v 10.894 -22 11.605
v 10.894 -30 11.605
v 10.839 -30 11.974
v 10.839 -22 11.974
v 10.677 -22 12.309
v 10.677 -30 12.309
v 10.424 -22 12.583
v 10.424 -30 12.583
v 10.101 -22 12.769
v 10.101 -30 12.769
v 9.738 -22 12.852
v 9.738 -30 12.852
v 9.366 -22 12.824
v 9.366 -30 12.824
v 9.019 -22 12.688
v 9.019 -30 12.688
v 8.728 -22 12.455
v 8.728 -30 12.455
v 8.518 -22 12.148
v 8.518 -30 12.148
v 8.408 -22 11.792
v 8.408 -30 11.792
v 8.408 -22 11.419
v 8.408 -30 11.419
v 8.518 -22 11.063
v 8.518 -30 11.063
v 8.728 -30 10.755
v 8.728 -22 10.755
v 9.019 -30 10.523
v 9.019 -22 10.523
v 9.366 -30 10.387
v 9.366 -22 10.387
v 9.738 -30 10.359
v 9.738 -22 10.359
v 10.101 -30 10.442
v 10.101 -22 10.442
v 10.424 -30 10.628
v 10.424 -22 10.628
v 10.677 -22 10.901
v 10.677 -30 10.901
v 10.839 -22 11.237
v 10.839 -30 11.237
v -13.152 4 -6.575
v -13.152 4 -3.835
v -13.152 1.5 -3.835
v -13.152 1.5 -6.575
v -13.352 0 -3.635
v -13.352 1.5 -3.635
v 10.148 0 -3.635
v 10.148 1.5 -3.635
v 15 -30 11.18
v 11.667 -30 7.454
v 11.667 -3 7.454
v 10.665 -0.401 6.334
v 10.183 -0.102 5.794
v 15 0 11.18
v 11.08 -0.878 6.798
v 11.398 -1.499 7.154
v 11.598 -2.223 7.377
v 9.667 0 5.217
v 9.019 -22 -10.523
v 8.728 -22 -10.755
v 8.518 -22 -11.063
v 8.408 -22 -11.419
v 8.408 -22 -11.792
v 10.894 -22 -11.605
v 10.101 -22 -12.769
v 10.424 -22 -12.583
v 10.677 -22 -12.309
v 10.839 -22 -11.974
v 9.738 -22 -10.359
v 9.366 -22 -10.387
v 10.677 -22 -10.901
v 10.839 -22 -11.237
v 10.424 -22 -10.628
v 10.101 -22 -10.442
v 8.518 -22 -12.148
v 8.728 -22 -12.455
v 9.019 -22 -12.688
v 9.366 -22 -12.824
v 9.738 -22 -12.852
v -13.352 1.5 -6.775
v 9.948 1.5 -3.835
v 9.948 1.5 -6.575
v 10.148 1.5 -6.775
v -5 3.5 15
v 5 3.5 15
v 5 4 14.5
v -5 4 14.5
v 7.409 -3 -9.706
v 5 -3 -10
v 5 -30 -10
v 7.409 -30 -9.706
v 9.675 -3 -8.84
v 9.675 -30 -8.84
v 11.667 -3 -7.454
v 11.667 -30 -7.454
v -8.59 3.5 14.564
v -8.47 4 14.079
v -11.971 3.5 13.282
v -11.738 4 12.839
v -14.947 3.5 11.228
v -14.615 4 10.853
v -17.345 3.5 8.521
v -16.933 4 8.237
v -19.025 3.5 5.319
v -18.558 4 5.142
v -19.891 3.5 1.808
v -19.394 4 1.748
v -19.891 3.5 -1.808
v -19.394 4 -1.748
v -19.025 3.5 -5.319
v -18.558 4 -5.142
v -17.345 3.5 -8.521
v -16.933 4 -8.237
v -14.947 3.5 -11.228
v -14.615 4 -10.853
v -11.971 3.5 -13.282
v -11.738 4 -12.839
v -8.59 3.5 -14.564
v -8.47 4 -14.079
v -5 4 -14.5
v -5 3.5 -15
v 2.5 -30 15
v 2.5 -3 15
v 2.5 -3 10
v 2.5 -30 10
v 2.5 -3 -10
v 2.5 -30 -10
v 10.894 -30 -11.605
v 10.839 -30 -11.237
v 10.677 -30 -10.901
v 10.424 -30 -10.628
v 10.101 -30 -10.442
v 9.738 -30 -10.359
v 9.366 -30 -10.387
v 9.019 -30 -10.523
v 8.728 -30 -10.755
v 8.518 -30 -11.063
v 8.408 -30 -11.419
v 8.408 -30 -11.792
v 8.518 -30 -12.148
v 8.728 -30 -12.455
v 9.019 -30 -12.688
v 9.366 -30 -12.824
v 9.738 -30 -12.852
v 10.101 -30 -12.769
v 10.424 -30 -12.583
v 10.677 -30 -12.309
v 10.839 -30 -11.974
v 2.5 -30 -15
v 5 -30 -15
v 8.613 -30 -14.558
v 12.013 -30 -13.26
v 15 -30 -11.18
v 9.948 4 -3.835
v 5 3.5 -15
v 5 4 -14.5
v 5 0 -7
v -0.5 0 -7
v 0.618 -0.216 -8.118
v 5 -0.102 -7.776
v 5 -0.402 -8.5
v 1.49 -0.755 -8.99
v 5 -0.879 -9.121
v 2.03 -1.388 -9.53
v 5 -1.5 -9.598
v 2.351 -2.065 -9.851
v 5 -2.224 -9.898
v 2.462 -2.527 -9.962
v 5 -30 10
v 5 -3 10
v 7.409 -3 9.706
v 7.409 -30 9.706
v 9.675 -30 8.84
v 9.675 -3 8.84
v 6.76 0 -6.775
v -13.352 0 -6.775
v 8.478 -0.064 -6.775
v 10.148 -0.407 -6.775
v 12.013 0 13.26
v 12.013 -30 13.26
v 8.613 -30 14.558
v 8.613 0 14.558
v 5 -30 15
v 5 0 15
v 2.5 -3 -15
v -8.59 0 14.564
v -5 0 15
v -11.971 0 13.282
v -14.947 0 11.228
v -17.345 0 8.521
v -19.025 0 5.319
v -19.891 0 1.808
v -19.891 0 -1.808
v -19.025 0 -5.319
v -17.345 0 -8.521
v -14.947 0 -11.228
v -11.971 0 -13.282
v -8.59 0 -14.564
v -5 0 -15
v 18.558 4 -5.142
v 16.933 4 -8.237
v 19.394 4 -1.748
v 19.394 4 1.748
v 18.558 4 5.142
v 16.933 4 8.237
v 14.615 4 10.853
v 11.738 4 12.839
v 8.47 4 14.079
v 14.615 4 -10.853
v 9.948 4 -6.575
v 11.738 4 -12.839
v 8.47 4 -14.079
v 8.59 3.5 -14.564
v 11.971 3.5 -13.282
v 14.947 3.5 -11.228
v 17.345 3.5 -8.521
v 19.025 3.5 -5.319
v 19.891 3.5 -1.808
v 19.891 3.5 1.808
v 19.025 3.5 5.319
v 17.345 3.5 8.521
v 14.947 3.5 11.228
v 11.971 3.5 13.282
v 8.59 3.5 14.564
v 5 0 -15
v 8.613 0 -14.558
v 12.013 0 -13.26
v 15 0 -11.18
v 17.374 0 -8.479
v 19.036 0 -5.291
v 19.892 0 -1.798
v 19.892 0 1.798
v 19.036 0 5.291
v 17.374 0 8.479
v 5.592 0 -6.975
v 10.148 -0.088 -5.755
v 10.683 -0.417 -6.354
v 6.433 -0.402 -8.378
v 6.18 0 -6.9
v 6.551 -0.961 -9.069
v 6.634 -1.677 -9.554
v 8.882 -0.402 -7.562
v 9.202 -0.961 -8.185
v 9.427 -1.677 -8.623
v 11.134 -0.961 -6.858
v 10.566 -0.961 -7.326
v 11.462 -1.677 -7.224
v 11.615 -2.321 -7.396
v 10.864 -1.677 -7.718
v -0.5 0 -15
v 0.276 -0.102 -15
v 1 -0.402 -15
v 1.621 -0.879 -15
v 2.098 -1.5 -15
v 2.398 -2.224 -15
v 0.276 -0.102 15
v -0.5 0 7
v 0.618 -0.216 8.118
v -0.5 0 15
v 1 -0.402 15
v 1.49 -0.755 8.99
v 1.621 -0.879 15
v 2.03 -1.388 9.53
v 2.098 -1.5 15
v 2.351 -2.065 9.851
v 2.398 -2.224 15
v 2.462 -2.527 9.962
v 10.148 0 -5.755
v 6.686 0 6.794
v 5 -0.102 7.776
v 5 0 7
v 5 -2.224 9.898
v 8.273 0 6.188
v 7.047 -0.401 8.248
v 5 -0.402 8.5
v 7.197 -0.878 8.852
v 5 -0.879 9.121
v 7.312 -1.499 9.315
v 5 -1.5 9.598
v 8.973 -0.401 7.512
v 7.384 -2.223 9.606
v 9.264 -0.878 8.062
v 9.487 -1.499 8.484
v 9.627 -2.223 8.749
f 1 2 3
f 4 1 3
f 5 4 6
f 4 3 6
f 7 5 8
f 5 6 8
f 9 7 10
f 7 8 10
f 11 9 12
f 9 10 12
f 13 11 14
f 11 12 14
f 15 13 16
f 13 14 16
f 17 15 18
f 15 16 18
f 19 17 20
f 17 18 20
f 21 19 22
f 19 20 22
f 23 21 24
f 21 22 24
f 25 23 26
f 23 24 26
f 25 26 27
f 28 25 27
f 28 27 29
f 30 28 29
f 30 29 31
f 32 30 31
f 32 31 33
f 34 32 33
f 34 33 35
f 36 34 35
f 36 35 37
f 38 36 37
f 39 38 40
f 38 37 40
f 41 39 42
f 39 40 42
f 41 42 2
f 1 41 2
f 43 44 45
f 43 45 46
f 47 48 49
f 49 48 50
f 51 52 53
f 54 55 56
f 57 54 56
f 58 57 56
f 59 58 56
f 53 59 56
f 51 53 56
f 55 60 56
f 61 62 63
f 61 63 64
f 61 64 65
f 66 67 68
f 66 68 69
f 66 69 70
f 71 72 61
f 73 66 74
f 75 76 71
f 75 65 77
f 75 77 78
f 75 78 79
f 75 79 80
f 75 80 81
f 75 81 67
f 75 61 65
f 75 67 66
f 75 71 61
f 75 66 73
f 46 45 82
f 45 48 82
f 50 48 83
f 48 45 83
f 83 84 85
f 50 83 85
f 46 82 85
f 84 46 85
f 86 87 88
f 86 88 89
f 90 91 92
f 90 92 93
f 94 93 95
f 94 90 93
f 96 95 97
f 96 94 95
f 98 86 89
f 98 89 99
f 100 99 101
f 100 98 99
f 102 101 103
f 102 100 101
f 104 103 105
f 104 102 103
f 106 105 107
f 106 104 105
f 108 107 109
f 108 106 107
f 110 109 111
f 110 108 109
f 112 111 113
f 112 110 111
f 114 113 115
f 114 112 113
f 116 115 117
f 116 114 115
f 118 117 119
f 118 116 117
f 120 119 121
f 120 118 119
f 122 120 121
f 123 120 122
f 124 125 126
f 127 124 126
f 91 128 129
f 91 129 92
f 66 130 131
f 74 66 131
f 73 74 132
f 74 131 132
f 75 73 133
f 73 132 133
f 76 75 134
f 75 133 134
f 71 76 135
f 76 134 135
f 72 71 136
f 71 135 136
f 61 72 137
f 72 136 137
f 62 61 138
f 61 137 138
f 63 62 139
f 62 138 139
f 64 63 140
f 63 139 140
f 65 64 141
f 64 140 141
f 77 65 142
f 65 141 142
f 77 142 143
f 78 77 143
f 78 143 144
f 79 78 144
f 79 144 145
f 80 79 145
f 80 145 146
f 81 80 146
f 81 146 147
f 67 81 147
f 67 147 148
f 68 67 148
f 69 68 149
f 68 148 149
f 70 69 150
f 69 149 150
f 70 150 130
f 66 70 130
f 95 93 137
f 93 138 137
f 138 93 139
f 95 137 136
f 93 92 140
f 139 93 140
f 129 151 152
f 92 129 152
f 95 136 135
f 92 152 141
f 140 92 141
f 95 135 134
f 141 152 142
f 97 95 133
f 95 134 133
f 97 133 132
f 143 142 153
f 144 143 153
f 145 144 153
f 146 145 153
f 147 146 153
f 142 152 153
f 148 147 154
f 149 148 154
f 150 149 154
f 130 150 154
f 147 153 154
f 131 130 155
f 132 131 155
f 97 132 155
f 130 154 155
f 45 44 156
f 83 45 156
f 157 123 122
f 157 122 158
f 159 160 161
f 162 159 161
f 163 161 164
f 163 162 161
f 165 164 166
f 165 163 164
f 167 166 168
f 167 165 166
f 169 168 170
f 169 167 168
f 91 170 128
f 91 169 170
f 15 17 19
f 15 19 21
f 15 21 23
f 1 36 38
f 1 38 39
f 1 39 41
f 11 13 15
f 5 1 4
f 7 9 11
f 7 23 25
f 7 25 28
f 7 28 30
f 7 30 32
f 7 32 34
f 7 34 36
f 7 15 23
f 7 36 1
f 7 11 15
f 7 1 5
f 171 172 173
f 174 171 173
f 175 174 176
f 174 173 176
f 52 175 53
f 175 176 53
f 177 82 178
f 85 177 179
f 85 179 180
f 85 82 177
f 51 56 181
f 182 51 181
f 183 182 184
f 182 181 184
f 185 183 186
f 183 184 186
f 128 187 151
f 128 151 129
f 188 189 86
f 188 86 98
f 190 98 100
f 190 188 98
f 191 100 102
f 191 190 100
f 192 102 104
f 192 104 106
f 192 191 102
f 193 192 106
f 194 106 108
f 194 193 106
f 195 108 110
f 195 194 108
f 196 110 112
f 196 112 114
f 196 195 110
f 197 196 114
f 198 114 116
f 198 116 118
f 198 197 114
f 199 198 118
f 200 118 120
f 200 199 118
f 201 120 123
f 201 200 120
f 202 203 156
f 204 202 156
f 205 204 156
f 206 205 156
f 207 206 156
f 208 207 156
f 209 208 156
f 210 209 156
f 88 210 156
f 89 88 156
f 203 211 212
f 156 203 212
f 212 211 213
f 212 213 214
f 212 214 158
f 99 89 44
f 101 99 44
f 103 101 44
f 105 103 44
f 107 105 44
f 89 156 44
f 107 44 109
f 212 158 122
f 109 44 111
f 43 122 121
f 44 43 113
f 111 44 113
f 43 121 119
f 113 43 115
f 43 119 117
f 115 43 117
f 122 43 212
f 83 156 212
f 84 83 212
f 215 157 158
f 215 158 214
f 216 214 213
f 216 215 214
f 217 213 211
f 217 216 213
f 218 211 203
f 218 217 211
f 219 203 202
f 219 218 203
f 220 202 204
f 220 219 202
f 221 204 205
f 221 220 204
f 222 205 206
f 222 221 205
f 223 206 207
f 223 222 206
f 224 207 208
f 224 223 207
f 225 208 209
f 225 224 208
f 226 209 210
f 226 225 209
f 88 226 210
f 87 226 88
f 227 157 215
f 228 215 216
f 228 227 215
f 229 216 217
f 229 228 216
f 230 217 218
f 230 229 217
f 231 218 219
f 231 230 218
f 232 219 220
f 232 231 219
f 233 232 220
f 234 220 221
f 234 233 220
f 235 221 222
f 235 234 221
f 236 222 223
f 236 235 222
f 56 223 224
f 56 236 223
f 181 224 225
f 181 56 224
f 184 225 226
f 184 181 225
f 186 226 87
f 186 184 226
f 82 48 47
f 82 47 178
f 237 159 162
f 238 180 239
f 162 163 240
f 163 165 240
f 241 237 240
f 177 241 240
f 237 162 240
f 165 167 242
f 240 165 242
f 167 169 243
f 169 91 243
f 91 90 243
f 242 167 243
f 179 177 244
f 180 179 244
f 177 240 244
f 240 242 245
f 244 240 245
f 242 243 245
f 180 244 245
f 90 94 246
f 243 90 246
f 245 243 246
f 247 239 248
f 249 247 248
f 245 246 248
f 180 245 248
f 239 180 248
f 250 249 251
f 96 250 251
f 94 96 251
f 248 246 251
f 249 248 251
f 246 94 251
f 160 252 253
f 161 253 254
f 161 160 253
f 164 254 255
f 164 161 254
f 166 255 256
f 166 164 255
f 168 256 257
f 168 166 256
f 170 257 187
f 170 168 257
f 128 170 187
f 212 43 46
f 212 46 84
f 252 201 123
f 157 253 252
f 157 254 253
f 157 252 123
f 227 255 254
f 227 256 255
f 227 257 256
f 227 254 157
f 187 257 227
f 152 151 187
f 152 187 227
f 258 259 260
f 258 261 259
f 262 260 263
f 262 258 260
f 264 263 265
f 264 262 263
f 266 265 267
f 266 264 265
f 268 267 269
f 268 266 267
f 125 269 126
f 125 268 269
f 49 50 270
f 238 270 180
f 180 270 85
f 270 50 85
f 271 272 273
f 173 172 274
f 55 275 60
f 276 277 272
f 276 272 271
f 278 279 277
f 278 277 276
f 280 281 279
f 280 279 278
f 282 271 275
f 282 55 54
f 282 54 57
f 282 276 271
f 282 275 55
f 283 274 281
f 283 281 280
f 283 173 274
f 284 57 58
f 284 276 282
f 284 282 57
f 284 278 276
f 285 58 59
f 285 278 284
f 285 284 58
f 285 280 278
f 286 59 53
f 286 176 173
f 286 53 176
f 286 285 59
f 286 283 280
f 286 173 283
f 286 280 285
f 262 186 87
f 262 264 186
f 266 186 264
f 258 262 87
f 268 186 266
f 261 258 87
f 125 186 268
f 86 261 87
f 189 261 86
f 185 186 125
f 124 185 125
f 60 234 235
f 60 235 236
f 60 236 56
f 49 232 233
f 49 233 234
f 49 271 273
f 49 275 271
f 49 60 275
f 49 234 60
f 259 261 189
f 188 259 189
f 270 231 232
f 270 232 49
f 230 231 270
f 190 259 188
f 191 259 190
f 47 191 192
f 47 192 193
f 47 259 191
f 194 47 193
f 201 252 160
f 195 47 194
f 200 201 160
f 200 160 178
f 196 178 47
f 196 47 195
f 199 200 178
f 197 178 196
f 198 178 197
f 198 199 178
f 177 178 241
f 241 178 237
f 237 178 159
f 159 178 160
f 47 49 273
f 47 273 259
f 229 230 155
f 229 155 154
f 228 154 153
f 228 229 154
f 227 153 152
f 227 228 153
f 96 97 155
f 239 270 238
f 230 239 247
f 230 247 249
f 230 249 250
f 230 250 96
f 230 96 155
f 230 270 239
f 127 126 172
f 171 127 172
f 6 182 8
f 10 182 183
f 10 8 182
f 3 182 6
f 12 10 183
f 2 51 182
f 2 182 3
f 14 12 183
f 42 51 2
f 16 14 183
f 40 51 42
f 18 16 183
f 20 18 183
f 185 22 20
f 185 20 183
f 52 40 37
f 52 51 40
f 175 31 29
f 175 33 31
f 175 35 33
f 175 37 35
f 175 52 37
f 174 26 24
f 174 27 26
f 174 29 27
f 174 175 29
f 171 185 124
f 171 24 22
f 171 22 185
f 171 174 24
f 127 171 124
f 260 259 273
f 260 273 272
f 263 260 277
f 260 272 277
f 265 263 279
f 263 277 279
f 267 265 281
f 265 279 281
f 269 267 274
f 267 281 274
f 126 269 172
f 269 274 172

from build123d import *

# Parameters (mm, degrees)
AUFSATZ_LINEAR_AUSTRAGEN1_DEPTH   = 30
AUFSATZ_LINEAR_AUSTRAGEN1_2_DEPTH = 30
AUFSATZ_LINEAR_START              = 4
AUFSATZ_LINEAR_AUSTRAGEN2_DEPTH   = 4
VERRUNDUNG1_R                     = 3
VERRUNDUNG2_R                     = 3
FASE1_SIZE                        = 0.5
SKIZZE3_R                         = 1.25
SCHNITT_LINEAR_AUSTRAGEN1_DEPTH   = 8
SKIZZE4_W                         = 23.1
SKIZZE4_H                         = 2.74
SCHNITT_LINEAR_AUSTRAGEN2_DEPTH   = 2.5
SCHNITT_LINEAR_AUSTRAGEN3_REACH   = 42.215
SKIZZE5_W                         = 23.5
SKIZZE5_H                         = 3.14


with BuildPart() as part:
    # Skizze1 → Aufsatz-Linear austragen1 (new body)
    with BuildSketch(Plane(origin=(0, 0, 0), x_dir=(1, 0, 0), z_dir=(0, 1, 0))):
        with BuildLine():
            Line((5, 15), (2.5, 15))
            Line((2.5, 15), (2.5, 10))
            Line((2.5, 10), (5, 10))
            ThreePointArc((5, 10), (8.568220898, 9.34172359), (11.666666667, 7.453559925))
            Line((11.666666667, 7.453559925), (15, 11.180339887))
            ThreePointArc((15, 11.180339887), (10.352331347, 14.012585384), (5, 15))
        make_face()
    extrude(amount=-AUFSATZ_LINEAR_AUSTRAGEN1_DEPTH)



with BuildPart() as body_2:
    # Skizze1 → Aufsatz-Linear austragen1 2 (new body)
    with BuildSketch(Plane(origin=(0, 0, 0), x_dir=(1, 0, 0), z_dir=(0, 1, 0))):
        with BuildLine():
            Line((11.666666667, -7.453559925), (15, -11.180339887))
            ThreePointArc((15, -11.180339887), (10.352331347, -14.012585384), (5, -15))
            Line((5, -15), (2.5, -15))
            Line((2.5, -15), (2.5, -10))
            Line((2.5, -10), (5, -10))
            ThreePointArc((5, -10), (8.568220898, -9.34172359), (11.666666667, -7.453559925))
        make_face()
    extrude(amount=-AUFSATZ_LINEAR_AUSTRAGEN1_2_DEPTH)


with BuildPart() as part_1:
    add(part.part)

    add(body_2.part)  # Aufsatz-Linear austragen2 merges body 2
    # Skizze2 → Aufsatz-Linear austragen2 (add)
    with BuildSketch(Plane(origin=(0, 0, 0), x_dir=(1, 0, 0), z_dir=(0, 1, 0)).offset(AUFSATZ_LINEAR_START)):
        with BuildLine():
            Line((-5, 15), (5, 15))
            ThreePointArc((5, 15), (20, 0), (5, -15))
            Line((5, -15), (-5, -15))
            ThreePointArc((-5, -15), (-20, 0), (-5, 15))
        make_face()
    extrude(amount=-AUFSATZ_LINEAR_AUSTRAGEN2_DEPTH)

    # Verrundung1
    verrundung1_edges = [part_1.edges().sort_by_distance(p)[0] for p in [
        (3.75, 0, 10),
        (8.568220898, 0, 9.34172359),
        (8.568220898, 0, -9.34172359),
        (3.75, 0, -10),
    ]]
    fillet(verrundung1_edges, radius=VERRUNDUNG1_R)

    # Verrundung2
    verrundung2_edges = [part_1.edges().sort_by_distance(p)[0] for p in [
        (2.5, 0, 11),
        (2.5, 0, -11),
    ]]
    fillet(verrundung2_edges, radius=VERRUNDUNG2_R)

    # Fase1
    fase1_edges = [part_1.edges().sort_by_distance(p)[0] for p in [
        (-20, 4, 0),
        (0, 4, 15),
        (0, 4, -15),
        (20, 4, 0),
    ]]
    chamfer(fase1_edges, length=FASE1_SIZE)

    # Skizze3 → Schnitt-Linear austragen1 (cut)
    with BuildSketch(Plane.XZ.offset(30)):
        with Locations((9.644187298, -11.605236936)):
            Circle(SKIZZE3_R)
        with Locations((9.644187298, 11.605236936)):
            Circle(SKIZZE3_R)
    extrude(amount=-SCHNITT_LINEAR_AUSTRAGEN1_DEPTH, mode=Mode.SUBTRACT)

    # Skizze4 → Schnitt-Linear austragen2 (cut)
    with BuildSketch(Plane(origin=(0, 4, 0), x_dir=(1, 0, 0), z_dir=(0, 1, 0))):
        with Locations((-1.602471757, 5.205199937)):
            Rectangle(SKIZZE4_W, SKIZZE4_H)
    extrude(amount=-SCHNITT_LINEAR_AUSTRAGEN2_DEPTH, mode=Mode.SUBTRACT)

    # Skizze5 → Schnitt-Linear austragen3 (cut, up to next)
    with BuildSketch(Plane(origin=(0, 1.5, 0), x_dir=(1, 0, 0), z_dir=(0, 1, 0)), mode=Mode.PRIVATE) as schnitt_linear_austragen3_sk1:
        with Locations((-1.602471757, 5.205199937)):
            Rectangle(SKIZZE5_W, SKIZZE5_H)
    schnitt_linear_austragen3_tool1 = extrude(schnitt_linear_austragen3_sk1.sketch, amount=-SCHNITT_LINEAR_AUSTRAGEN3_REACH, mode=Mode.PRIVATE) & part_1.part
    add(schnitt_linear_austragen3_tool1.solids().sort_by_distance((-1.602472, 1.5, -5.2052))[0], mode=Mode.SUBTRACT)


solid = part_1.part
